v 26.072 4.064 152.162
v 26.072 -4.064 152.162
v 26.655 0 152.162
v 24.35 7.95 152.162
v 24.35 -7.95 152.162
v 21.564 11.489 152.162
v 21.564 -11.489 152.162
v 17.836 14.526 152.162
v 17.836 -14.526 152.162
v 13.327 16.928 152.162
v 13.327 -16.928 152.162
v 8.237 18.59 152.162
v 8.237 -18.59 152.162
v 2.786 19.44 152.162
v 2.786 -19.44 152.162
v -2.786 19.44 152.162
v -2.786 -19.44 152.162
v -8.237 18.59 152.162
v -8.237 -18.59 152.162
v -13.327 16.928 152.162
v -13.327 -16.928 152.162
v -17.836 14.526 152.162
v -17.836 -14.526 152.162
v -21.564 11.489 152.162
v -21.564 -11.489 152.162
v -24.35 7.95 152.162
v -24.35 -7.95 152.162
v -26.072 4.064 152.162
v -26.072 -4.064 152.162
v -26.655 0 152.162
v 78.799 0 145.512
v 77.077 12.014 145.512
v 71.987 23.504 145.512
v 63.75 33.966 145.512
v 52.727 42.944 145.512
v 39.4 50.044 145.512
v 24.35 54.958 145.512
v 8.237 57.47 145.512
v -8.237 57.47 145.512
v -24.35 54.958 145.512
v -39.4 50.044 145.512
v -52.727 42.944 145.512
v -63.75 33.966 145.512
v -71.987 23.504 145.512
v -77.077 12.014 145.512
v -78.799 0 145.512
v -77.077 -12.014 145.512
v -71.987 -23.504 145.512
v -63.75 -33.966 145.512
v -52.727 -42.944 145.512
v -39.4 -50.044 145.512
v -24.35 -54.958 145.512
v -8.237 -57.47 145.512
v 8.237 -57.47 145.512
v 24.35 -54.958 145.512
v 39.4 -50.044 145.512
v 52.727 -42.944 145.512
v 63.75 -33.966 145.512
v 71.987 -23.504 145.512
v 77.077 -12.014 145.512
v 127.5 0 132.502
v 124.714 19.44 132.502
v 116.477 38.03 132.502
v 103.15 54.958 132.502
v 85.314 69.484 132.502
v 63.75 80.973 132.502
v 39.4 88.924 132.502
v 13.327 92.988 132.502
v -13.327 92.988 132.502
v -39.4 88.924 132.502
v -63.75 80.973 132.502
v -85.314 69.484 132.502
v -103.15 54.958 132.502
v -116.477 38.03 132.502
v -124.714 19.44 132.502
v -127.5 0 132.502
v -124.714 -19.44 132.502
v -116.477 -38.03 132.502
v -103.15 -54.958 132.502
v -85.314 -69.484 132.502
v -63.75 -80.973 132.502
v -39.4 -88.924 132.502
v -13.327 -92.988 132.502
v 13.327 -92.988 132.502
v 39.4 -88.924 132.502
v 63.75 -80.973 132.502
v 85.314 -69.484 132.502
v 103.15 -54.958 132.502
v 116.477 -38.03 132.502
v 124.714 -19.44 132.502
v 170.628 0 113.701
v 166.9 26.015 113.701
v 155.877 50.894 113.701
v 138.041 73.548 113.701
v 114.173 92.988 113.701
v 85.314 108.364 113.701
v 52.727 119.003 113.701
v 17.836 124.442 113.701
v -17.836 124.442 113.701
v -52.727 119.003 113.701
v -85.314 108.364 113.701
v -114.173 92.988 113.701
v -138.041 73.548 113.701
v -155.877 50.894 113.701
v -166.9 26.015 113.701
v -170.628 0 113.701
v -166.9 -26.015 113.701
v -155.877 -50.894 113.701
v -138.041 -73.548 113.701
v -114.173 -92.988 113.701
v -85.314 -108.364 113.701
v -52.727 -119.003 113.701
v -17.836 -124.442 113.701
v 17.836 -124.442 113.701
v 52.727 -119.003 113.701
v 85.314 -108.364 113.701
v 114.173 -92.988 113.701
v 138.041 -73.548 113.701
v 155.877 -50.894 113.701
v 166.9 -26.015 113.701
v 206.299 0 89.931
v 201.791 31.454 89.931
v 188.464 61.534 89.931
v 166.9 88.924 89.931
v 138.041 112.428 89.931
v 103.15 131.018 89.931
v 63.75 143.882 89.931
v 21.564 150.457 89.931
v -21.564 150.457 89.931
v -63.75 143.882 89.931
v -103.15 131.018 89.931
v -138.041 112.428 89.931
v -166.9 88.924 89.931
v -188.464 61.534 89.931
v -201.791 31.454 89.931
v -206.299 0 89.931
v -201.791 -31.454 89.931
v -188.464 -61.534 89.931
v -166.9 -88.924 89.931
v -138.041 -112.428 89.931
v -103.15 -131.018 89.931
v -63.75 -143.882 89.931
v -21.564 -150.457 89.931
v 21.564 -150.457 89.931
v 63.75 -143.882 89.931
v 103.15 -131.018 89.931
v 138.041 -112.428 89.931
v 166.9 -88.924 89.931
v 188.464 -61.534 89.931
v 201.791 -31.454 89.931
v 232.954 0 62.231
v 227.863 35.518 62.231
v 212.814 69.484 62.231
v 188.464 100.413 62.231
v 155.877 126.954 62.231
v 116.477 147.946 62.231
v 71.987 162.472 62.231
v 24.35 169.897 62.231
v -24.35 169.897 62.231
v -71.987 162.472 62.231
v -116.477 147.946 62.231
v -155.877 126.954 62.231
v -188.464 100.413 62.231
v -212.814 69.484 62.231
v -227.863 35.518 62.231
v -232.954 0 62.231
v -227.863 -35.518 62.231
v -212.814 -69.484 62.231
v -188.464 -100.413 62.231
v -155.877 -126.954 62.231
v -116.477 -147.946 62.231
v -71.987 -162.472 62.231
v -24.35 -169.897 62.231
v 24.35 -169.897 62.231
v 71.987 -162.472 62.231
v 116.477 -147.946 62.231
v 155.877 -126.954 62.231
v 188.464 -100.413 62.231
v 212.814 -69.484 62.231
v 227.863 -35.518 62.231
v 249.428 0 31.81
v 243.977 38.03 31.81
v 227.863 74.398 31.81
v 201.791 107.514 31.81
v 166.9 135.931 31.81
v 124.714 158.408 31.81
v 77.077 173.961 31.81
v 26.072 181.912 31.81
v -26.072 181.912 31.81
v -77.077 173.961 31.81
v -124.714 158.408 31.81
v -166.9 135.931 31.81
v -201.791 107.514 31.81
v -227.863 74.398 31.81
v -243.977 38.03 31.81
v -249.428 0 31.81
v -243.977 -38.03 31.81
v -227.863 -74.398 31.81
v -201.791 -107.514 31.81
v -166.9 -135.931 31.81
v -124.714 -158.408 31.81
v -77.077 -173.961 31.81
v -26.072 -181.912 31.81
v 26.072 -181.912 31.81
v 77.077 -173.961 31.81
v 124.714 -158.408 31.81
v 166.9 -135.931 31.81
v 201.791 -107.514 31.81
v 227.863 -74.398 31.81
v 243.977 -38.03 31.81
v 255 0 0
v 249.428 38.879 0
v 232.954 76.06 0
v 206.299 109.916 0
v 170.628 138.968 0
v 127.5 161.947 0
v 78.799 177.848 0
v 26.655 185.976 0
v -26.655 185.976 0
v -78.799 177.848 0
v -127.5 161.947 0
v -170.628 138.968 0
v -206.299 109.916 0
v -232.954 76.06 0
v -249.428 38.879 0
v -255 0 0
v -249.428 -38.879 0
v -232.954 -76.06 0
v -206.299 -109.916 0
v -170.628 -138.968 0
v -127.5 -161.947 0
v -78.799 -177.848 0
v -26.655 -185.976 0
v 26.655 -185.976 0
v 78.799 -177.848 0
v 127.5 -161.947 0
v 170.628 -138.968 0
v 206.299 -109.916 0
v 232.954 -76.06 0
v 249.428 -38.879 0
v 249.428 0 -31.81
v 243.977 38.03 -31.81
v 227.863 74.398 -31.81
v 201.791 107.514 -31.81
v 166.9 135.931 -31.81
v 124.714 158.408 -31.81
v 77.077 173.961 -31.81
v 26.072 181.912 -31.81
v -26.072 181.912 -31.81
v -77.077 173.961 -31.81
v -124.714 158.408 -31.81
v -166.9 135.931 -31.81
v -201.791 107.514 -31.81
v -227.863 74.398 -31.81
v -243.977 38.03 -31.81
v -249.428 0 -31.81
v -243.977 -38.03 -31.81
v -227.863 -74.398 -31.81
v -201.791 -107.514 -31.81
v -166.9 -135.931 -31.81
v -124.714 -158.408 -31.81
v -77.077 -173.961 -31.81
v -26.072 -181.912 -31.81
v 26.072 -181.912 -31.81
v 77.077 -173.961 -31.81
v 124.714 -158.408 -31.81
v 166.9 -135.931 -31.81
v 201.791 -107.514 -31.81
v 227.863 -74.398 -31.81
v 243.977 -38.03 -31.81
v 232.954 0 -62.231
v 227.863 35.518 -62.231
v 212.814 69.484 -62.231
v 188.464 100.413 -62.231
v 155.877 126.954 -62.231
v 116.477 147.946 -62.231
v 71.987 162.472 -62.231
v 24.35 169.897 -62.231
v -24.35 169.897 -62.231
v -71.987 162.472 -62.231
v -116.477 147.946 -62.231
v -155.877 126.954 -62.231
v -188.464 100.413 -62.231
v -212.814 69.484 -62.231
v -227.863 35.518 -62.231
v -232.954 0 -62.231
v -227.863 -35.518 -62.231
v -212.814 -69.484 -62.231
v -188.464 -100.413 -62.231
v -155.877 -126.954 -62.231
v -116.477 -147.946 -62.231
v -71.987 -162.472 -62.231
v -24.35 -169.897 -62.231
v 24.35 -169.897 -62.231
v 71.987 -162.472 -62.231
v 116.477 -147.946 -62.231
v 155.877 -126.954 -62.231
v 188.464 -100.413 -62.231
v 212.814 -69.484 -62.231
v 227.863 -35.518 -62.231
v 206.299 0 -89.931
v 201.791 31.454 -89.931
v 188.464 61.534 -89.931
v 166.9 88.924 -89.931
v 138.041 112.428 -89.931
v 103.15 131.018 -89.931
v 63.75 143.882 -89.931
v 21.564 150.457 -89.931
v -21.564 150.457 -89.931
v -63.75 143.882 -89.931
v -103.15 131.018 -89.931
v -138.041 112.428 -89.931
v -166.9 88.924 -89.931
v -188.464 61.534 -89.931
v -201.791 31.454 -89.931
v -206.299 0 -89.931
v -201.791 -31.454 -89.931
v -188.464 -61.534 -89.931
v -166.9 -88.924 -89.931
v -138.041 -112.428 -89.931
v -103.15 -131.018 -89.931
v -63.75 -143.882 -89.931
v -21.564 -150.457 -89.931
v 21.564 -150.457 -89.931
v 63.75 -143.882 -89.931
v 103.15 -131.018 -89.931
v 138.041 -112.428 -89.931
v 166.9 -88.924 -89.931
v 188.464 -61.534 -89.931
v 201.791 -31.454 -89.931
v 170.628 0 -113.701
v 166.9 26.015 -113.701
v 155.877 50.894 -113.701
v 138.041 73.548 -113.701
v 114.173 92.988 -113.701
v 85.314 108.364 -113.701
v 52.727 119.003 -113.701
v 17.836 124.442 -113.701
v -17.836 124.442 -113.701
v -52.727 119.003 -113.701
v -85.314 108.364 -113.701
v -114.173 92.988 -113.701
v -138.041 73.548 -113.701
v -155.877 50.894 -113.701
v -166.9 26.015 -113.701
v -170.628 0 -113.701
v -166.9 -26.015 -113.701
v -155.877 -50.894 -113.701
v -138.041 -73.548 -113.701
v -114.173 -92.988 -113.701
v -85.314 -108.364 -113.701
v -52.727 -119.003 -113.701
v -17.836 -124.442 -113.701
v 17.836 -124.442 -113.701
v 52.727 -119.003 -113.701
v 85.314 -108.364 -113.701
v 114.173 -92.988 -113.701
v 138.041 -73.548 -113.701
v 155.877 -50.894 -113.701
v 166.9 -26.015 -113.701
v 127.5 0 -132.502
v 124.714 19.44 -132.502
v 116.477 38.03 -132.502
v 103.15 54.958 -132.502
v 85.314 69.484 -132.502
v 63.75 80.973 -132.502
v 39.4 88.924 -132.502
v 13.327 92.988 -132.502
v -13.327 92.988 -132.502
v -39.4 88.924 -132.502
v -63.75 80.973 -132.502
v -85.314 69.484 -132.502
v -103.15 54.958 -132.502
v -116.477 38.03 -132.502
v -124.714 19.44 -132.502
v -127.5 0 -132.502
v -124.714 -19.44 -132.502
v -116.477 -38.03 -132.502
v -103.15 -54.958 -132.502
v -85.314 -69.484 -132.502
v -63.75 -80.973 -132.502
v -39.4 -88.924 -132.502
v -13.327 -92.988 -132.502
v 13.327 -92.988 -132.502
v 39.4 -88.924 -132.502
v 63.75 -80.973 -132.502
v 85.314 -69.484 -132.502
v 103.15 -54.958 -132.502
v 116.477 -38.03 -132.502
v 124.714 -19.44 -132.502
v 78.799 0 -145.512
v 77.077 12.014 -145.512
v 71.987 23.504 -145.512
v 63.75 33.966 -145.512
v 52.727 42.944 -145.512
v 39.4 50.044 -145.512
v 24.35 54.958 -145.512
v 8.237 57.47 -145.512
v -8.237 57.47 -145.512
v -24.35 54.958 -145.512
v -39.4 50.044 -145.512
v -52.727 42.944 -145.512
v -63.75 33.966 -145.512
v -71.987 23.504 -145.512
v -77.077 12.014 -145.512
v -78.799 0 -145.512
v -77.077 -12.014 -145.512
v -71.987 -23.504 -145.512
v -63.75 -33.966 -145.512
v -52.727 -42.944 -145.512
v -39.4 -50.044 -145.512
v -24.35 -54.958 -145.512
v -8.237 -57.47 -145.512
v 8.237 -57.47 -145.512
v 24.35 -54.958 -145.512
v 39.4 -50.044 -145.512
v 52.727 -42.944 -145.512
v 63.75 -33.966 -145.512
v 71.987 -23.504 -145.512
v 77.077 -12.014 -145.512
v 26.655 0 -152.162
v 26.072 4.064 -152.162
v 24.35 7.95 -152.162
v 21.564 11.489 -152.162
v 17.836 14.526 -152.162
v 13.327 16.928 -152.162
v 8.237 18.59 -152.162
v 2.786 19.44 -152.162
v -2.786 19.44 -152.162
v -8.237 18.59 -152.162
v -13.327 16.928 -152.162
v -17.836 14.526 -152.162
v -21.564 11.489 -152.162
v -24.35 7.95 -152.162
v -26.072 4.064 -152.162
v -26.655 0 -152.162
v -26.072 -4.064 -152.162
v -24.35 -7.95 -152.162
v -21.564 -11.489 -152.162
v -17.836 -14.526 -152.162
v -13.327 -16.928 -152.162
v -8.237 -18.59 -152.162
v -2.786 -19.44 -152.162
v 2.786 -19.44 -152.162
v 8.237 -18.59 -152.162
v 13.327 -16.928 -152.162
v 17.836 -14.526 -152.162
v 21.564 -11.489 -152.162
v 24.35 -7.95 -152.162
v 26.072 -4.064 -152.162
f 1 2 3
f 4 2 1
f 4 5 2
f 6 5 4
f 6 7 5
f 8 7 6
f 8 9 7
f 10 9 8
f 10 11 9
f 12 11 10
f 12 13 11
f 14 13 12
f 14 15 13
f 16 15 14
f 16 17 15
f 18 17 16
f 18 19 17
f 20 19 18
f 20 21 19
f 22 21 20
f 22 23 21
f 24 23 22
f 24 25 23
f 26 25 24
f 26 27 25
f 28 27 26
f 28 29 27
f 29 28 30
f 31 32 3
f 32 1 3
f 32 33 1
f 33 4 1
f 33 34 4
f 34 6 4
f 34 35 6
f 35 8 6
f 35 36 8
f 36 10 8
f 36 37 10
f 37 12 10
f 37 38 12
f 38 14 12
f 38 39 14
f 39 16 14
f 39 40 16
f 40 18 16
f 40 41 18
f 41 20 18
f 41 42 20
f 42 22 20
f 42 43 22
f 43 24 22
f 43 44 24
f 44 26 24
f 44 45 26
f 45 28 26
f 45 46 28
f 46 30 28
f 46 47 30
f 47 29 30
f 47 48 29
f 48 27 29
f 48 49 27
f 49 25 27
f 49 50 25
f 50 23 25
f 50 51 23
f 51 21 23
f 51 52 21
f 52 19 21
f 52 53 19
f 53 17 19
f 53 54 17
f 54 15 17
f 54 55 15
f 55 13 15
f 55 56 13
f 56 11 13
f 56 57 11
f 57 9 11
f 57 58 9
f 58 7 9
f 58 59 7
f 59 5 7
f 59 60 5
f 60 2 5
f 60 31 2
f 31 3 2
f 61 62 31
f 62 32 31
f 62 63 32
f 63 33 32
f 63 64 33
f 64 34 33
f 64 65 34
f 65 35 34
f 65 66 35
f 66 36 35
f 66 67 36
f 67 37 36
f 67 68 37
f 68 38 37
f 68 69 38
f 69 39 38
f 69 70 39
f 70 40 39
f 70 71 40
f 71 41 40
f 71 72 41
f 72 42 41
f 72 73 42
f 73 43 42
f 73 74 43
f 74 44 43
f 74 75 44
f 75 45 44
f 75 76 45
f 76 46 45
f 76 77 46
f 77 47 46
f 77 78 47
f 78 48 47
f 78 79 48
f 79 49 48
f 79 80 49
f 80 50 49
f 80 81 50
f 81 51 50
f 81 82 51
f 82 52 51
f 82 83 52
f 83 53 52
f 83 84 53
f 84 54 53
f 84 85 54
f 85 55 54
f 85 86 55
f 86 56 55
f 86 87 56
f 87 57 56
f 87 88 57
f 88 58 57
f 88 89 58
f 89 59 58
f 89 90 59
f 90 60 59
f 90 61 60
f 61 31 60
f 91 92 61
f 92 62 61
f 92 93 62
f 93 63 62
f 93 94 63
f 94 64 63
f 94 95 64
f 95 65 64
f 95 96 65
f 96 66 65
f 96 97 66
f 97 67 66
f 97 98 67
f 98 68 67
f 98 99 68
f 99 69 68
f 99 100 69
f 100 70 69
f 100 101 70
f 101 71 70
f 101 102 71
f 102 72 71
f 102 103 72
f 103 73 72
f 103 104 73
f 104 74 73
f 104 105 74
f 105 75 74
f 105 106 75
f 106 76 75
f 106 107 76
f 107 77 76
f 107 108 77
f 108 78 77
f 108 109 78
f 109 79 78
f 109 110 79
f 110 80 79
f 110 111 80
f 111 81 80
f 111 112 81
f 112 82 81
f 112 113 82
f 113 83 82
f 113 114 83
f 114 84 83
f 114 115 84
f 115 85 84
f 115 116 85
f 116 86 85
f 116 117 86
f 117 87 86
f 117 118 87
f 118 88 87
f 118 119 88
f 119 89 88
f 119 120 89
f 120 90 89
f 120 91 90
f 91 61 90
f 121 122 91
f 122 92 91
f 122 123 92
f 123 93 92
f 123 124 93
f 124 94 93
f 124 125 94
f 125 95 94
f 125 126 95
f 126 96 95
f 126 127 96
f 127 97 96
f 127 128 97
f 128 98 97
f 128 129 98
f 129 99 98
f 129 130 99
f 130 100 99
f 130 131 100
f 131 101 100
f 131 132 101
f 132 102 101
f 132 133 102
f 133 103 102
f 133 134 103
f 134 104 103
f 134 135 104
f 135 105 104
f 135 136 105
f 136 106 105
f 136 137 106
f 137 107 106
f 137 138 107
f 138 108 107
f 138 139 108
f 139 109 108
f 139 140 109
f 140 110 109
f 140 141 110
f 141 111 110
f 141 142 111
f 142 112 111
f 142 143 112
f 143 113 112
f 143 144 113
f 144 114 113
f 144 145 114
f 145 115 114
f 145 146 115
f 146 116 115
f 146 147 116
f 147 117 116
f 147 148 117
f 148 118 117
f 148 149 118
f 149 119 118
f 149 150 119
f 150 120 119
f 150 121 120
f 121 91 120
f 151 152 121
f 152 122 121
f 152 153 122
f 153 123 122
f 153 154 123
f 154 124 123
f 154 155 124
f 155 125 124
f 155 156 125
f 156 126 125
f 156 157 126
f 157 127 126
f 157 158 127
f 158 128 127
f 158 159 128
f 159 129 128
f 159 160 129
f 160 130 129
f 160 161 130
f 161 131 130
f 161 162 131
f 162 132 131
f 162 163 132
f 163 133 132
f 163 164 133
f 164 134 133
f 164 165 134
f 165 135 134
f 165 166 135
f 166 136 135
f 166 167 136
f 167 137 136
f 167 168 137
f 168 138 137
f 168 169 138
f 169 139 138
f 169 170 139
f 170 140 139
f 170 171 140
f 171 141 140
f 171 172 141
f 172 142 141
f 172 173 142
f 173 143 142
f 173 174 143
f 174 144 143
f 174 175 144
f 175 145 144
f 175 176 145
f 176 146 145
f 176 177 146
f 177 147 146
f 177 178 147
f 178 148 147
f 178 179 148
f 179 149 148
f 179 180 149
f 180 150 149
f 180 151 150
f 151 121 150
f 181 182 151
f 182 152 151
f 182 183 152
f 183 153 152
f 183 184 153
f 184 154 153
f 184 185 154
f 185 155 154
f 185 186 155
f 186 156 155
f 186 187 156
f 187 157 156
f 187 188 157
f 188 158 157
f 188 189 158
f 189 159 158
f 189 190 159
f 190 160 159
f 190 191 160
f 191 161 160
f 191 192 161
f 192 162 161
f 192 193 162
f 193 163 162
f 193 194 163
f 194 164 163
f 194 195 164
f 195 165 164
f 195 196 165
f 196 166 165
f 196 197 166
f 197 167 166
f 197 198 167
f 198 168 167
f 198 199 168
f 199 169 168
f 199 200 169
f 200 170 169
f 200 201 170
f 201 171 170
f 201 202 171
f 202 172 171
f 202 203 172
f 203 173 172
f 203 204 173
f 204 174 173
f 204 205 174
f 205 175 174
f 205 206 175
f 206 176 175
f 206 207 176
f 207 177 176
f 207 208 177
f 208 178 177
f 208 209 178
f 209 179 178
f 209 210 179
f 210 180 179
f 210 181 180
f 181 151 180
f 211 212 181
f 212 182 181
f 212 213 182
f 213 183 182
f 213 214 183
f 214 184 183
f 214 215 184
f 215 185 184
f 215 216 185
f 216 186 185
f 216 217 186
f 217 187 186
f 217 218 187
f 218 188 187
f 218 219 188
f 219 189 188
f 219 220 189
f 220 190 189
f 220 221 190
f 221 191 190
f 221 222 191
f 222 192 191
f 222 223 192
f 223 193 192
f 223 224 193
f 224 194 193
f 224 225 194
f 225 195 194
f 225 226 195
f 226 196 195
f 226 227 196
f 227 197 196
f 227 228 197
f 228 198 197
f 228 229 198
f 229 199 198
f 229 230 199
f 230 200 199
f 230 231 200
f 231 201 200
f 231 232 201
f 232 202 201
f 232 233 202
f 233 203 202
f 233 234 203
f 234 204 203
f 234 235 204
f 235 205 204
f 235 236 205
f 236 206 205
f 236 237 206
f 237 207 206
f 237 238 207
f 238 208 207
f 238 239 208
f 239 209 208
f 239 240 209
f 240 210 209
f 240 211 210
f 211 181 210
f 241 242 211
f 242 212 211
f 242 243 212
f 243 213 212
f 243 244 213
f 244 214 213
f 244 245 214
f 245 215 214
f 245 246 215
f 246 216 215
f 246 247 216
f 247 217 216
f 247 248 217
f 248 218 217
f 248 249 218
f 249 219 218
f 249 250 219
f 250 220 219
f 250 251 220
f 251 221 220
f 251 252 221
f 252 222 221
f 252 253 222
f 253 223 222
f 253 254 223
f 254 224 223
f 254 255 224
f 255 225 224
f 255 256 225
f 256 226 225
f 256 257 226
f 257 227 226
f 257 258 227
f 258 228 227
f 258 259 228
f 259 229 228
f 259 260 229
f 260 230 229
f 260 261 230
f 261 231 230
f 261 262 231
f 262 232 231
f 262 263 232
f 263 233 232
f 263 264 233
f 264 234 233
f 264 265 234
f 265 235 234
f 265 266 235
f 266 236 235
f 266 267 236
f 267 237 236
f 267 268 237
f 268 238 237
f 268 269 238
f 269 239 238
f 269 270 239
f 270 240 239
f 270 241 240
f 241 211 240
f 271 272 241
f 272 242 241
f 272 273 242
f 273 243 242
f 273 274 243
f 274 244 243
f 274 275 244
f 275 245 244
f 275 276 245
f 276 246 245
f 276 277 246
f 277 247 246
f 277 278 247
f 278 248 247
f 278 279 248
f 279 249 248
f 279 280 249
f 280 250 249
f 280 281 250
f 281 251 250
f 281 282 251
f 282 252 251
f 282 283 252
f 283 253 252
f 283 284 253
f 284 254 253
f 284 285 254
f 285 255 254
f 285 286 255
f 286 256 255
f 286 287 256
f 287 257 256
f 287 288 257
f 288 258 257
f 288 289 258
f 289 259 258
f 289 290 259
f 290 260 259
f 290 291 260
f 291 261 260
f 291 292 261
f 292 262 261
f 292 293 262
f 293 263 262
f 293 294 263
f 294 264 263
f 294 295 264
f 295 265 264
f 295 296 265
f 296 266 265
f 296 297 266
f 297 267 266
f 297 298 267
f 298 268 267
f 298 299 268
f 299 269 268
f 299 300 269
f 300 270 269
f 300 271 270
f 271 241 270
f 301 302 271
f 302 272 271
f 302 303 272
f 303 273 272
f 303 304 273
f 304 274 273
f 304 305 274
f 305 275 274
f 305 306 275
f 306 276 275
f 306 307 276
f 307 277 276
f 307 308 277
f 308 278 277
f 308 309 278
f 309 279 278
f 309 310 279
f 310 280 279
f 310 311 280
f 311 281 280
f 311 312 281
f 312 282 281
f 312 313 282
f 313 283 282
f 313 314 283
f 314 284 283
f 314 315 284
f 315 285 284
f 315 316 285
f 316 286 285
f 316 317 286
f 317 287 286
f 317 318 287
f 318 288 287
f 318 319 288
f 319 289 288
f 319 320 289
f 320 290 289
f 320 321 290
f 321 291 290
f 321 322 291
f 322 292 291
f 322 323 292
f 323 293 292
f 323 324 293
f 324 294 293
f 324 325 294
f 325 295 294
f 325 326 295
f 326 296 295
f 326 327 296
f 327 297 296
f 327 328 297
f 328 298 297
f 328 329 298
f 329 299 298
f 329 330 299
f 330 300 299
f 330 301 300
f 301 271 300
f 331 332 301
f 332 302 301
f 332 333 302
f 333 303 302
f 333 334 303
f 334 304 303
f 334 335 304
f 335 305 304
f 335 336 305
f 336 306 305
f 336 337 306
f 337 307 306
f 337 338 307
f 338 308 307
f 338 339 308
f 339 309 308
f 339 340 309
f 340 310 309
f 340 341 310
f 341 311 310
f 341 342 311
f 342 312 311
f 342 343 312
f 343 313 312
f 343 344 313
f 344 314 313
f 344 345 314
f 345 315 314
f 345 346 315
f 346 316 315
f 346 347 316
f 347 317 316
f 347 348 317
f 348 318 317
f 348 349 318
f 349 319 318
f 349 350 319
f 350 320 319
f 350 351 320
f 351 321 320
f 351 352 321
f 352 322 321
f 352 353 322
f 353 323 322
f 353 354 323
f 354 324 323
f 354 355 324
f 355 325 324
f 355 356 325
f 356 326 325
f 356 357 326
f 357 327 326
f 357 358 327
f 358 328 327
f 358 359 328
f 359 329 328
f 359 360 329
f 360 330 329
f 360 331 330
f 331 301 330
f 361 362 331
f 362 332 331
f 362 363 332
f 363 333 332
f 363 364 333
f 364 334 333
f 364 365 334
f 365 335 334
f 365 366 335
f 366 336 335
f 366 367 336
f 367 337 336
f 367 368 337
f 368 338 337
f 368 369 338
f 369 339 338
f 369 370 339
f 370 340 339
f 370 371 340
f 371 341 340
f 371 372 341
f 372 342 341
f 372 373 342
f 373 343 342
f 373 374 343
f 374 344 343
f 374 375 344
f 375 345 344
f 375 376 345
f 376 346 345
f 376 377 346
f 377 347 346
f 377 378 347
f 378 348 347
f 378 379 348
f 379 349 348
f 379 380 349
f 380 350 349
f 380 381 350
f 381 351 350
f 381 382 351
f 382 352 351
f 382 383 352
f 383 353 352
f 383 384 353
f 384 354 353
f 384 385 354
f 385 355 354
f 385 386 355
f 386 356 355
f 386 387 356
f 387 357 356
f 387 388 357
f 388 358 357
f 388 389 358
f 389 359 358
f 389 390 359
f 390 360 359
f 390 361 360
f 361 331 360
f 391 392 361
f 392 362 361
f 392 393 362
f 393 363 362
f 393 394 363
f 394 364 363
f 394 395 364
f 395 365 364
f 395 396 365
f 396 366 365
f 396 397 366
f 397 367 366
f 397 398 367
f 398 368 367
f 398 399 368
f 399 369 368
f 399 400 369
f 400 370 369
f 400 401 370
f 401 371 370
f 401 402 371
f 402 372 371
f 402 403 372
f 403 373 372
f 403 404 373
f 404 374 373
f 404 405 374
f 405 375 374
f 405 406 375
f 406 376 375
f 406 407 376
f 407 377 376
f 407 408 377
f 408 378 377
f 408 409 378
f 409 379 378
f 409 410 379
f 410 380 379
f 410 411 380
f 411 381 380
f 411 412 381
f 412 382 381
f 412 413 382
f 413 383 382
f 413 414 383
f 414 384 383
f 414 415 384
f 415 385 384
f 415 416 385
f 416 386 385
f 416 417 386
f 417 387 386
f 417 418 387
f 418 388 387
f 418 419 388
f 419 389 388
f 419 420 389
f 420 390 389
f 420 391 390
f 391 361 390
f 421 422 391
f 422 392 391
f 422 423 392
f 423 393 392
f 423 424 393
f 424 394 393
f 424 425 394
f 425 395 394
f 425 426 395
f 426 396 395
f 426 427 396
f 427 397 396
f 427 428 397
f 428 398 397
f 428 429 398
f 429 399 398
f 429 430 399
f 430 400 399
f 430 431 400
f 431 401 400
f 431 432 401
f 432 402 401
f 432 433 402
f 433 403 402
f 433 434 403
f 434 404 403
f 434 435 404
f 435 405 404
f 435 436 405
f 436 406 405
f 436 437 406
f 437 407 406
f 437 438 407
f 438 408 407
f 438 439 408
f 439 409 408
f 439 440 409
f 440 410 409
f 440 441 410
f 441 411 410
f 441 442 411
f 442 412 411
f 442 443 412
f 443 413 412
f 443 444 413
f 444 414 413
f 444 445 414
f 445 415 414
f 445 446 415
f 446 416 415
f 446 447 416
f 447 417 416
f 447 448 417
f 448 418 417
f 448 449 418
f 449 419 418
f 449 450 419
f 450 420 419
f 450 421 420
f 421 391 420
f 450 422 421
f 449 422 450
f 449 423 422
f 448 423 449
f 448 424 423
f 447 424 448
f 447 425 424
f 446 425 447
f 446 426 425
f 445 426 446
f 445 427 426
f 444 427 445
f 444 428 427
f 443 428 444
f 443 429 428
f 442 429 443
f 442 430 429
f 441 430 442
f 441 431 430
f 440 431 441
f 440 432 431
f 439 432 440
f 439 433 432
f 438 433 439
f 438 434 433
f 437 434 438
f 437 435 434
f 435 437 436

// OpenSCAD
// Generated by SolidPython 1.0.1 on 2020-07-29 00:46:52


scale(v = [15, 11, 9]) {
	sphere(r = 17);
}
/***********************************************
*********      SolidPython code:      **********
************************************************
 
# import packages: SolidPython
from solid import *
from solid.utils import *
from itertools import chain, combinations, permutations


class Resize:

    def __init__(self, scad_file):
        self.scad_file = scad_file
        #self.scad_file = import_scad(scad_file)
        # cone/cylinder param:
        self.r1 = 0
        self.r2 = 0
        self.h = 0
        # rectangular prism param:
        self.w = 0
        self.l = 0
        # ellipse param:
        self.r = 0

    # import OpenScad code (file name corresponds to shape)


    # classify shape + parameters
    def assign(self, param1, param2, param3):
        if self.scad_file == 'cone.scad':
            self.r1 = param1
            self.r2 = param2
            self.h = param3
        elif self.scad_file == 'cylinder.scad':
            self.r1 = param1
            self.r2 = param2
            self.h = param3
        elif self.scad_file == 'rectangularPrism.scad':
            self.h = param1
            self.l = param2
            self.w = param3
        else:
            self.r = param1
            self.h = param2

    # resize parameters
    def iterate(self):
        x = range(3, 20, 2)
        i = 1
        if self.scad_file == 'cone.scad':
            tempList = list(permutations(x, 2))
            for temp in tempList:
                param1 = temp[0]
                param2 = temp[1]
                filepath = 'produced_scad_files/' + 'cone' + str(param1) + '_' + str(param2) + '_' + '.scad'
                scad_render_to_file(cylinder(h=param1, r1=param2, r2=0), filepath)

        elif self.scad_file == 'cylinder.scad':
            tempList = list(permutations(x, 3))
            for temp in tempList:
                param1 = temp[0]
                param2 = temp[1]
                filepath = 'produced_scad_files/' + 'cylinder' + str(param1) + '_' + str(param2) + '_' + '.scad'
                scad_render_to_file(cylinder(h=param1, r1=param2, r2=param2), filepath)

        elif self.scad_file == 'rectangularPrism.scad':
            tempList = list(permutations(x, 3))
            for temp in tempList:
                param1 = temp[0]
                param2 = temp[1]
                param3 = temp[2]
                filepath = 'produced_scad_files/' + 'rectangularPrism' + str(param1) + '_' + str(param2) + '_' + str(
                    param3) + '.scad'
                scad_render_to_file(cube(size=(param1, param2, param3)), filepath)

        elif self.scad_file == 'ellipse.scad':
            tempList = list(permutations(x, 4))
            for temp in tempList:
                param1 = temp[0]
                param2 = temp[1]
                param3 = temp[2]
                param4 = temp[3]
                filepath = 'produced_scad_files/' + 'ellipse' + str(param1) + '_' + str(param2) + '_' + str(param3) + '_' + str(param4) + '.scad'
                scad_render_to_file(scale([param1, param2, param3])(sphere(r=param4)), filepath)

    def render_to_scadfile(self):
        scad_render_to_file(scad, 'example.scad') 
 
************************************************/
